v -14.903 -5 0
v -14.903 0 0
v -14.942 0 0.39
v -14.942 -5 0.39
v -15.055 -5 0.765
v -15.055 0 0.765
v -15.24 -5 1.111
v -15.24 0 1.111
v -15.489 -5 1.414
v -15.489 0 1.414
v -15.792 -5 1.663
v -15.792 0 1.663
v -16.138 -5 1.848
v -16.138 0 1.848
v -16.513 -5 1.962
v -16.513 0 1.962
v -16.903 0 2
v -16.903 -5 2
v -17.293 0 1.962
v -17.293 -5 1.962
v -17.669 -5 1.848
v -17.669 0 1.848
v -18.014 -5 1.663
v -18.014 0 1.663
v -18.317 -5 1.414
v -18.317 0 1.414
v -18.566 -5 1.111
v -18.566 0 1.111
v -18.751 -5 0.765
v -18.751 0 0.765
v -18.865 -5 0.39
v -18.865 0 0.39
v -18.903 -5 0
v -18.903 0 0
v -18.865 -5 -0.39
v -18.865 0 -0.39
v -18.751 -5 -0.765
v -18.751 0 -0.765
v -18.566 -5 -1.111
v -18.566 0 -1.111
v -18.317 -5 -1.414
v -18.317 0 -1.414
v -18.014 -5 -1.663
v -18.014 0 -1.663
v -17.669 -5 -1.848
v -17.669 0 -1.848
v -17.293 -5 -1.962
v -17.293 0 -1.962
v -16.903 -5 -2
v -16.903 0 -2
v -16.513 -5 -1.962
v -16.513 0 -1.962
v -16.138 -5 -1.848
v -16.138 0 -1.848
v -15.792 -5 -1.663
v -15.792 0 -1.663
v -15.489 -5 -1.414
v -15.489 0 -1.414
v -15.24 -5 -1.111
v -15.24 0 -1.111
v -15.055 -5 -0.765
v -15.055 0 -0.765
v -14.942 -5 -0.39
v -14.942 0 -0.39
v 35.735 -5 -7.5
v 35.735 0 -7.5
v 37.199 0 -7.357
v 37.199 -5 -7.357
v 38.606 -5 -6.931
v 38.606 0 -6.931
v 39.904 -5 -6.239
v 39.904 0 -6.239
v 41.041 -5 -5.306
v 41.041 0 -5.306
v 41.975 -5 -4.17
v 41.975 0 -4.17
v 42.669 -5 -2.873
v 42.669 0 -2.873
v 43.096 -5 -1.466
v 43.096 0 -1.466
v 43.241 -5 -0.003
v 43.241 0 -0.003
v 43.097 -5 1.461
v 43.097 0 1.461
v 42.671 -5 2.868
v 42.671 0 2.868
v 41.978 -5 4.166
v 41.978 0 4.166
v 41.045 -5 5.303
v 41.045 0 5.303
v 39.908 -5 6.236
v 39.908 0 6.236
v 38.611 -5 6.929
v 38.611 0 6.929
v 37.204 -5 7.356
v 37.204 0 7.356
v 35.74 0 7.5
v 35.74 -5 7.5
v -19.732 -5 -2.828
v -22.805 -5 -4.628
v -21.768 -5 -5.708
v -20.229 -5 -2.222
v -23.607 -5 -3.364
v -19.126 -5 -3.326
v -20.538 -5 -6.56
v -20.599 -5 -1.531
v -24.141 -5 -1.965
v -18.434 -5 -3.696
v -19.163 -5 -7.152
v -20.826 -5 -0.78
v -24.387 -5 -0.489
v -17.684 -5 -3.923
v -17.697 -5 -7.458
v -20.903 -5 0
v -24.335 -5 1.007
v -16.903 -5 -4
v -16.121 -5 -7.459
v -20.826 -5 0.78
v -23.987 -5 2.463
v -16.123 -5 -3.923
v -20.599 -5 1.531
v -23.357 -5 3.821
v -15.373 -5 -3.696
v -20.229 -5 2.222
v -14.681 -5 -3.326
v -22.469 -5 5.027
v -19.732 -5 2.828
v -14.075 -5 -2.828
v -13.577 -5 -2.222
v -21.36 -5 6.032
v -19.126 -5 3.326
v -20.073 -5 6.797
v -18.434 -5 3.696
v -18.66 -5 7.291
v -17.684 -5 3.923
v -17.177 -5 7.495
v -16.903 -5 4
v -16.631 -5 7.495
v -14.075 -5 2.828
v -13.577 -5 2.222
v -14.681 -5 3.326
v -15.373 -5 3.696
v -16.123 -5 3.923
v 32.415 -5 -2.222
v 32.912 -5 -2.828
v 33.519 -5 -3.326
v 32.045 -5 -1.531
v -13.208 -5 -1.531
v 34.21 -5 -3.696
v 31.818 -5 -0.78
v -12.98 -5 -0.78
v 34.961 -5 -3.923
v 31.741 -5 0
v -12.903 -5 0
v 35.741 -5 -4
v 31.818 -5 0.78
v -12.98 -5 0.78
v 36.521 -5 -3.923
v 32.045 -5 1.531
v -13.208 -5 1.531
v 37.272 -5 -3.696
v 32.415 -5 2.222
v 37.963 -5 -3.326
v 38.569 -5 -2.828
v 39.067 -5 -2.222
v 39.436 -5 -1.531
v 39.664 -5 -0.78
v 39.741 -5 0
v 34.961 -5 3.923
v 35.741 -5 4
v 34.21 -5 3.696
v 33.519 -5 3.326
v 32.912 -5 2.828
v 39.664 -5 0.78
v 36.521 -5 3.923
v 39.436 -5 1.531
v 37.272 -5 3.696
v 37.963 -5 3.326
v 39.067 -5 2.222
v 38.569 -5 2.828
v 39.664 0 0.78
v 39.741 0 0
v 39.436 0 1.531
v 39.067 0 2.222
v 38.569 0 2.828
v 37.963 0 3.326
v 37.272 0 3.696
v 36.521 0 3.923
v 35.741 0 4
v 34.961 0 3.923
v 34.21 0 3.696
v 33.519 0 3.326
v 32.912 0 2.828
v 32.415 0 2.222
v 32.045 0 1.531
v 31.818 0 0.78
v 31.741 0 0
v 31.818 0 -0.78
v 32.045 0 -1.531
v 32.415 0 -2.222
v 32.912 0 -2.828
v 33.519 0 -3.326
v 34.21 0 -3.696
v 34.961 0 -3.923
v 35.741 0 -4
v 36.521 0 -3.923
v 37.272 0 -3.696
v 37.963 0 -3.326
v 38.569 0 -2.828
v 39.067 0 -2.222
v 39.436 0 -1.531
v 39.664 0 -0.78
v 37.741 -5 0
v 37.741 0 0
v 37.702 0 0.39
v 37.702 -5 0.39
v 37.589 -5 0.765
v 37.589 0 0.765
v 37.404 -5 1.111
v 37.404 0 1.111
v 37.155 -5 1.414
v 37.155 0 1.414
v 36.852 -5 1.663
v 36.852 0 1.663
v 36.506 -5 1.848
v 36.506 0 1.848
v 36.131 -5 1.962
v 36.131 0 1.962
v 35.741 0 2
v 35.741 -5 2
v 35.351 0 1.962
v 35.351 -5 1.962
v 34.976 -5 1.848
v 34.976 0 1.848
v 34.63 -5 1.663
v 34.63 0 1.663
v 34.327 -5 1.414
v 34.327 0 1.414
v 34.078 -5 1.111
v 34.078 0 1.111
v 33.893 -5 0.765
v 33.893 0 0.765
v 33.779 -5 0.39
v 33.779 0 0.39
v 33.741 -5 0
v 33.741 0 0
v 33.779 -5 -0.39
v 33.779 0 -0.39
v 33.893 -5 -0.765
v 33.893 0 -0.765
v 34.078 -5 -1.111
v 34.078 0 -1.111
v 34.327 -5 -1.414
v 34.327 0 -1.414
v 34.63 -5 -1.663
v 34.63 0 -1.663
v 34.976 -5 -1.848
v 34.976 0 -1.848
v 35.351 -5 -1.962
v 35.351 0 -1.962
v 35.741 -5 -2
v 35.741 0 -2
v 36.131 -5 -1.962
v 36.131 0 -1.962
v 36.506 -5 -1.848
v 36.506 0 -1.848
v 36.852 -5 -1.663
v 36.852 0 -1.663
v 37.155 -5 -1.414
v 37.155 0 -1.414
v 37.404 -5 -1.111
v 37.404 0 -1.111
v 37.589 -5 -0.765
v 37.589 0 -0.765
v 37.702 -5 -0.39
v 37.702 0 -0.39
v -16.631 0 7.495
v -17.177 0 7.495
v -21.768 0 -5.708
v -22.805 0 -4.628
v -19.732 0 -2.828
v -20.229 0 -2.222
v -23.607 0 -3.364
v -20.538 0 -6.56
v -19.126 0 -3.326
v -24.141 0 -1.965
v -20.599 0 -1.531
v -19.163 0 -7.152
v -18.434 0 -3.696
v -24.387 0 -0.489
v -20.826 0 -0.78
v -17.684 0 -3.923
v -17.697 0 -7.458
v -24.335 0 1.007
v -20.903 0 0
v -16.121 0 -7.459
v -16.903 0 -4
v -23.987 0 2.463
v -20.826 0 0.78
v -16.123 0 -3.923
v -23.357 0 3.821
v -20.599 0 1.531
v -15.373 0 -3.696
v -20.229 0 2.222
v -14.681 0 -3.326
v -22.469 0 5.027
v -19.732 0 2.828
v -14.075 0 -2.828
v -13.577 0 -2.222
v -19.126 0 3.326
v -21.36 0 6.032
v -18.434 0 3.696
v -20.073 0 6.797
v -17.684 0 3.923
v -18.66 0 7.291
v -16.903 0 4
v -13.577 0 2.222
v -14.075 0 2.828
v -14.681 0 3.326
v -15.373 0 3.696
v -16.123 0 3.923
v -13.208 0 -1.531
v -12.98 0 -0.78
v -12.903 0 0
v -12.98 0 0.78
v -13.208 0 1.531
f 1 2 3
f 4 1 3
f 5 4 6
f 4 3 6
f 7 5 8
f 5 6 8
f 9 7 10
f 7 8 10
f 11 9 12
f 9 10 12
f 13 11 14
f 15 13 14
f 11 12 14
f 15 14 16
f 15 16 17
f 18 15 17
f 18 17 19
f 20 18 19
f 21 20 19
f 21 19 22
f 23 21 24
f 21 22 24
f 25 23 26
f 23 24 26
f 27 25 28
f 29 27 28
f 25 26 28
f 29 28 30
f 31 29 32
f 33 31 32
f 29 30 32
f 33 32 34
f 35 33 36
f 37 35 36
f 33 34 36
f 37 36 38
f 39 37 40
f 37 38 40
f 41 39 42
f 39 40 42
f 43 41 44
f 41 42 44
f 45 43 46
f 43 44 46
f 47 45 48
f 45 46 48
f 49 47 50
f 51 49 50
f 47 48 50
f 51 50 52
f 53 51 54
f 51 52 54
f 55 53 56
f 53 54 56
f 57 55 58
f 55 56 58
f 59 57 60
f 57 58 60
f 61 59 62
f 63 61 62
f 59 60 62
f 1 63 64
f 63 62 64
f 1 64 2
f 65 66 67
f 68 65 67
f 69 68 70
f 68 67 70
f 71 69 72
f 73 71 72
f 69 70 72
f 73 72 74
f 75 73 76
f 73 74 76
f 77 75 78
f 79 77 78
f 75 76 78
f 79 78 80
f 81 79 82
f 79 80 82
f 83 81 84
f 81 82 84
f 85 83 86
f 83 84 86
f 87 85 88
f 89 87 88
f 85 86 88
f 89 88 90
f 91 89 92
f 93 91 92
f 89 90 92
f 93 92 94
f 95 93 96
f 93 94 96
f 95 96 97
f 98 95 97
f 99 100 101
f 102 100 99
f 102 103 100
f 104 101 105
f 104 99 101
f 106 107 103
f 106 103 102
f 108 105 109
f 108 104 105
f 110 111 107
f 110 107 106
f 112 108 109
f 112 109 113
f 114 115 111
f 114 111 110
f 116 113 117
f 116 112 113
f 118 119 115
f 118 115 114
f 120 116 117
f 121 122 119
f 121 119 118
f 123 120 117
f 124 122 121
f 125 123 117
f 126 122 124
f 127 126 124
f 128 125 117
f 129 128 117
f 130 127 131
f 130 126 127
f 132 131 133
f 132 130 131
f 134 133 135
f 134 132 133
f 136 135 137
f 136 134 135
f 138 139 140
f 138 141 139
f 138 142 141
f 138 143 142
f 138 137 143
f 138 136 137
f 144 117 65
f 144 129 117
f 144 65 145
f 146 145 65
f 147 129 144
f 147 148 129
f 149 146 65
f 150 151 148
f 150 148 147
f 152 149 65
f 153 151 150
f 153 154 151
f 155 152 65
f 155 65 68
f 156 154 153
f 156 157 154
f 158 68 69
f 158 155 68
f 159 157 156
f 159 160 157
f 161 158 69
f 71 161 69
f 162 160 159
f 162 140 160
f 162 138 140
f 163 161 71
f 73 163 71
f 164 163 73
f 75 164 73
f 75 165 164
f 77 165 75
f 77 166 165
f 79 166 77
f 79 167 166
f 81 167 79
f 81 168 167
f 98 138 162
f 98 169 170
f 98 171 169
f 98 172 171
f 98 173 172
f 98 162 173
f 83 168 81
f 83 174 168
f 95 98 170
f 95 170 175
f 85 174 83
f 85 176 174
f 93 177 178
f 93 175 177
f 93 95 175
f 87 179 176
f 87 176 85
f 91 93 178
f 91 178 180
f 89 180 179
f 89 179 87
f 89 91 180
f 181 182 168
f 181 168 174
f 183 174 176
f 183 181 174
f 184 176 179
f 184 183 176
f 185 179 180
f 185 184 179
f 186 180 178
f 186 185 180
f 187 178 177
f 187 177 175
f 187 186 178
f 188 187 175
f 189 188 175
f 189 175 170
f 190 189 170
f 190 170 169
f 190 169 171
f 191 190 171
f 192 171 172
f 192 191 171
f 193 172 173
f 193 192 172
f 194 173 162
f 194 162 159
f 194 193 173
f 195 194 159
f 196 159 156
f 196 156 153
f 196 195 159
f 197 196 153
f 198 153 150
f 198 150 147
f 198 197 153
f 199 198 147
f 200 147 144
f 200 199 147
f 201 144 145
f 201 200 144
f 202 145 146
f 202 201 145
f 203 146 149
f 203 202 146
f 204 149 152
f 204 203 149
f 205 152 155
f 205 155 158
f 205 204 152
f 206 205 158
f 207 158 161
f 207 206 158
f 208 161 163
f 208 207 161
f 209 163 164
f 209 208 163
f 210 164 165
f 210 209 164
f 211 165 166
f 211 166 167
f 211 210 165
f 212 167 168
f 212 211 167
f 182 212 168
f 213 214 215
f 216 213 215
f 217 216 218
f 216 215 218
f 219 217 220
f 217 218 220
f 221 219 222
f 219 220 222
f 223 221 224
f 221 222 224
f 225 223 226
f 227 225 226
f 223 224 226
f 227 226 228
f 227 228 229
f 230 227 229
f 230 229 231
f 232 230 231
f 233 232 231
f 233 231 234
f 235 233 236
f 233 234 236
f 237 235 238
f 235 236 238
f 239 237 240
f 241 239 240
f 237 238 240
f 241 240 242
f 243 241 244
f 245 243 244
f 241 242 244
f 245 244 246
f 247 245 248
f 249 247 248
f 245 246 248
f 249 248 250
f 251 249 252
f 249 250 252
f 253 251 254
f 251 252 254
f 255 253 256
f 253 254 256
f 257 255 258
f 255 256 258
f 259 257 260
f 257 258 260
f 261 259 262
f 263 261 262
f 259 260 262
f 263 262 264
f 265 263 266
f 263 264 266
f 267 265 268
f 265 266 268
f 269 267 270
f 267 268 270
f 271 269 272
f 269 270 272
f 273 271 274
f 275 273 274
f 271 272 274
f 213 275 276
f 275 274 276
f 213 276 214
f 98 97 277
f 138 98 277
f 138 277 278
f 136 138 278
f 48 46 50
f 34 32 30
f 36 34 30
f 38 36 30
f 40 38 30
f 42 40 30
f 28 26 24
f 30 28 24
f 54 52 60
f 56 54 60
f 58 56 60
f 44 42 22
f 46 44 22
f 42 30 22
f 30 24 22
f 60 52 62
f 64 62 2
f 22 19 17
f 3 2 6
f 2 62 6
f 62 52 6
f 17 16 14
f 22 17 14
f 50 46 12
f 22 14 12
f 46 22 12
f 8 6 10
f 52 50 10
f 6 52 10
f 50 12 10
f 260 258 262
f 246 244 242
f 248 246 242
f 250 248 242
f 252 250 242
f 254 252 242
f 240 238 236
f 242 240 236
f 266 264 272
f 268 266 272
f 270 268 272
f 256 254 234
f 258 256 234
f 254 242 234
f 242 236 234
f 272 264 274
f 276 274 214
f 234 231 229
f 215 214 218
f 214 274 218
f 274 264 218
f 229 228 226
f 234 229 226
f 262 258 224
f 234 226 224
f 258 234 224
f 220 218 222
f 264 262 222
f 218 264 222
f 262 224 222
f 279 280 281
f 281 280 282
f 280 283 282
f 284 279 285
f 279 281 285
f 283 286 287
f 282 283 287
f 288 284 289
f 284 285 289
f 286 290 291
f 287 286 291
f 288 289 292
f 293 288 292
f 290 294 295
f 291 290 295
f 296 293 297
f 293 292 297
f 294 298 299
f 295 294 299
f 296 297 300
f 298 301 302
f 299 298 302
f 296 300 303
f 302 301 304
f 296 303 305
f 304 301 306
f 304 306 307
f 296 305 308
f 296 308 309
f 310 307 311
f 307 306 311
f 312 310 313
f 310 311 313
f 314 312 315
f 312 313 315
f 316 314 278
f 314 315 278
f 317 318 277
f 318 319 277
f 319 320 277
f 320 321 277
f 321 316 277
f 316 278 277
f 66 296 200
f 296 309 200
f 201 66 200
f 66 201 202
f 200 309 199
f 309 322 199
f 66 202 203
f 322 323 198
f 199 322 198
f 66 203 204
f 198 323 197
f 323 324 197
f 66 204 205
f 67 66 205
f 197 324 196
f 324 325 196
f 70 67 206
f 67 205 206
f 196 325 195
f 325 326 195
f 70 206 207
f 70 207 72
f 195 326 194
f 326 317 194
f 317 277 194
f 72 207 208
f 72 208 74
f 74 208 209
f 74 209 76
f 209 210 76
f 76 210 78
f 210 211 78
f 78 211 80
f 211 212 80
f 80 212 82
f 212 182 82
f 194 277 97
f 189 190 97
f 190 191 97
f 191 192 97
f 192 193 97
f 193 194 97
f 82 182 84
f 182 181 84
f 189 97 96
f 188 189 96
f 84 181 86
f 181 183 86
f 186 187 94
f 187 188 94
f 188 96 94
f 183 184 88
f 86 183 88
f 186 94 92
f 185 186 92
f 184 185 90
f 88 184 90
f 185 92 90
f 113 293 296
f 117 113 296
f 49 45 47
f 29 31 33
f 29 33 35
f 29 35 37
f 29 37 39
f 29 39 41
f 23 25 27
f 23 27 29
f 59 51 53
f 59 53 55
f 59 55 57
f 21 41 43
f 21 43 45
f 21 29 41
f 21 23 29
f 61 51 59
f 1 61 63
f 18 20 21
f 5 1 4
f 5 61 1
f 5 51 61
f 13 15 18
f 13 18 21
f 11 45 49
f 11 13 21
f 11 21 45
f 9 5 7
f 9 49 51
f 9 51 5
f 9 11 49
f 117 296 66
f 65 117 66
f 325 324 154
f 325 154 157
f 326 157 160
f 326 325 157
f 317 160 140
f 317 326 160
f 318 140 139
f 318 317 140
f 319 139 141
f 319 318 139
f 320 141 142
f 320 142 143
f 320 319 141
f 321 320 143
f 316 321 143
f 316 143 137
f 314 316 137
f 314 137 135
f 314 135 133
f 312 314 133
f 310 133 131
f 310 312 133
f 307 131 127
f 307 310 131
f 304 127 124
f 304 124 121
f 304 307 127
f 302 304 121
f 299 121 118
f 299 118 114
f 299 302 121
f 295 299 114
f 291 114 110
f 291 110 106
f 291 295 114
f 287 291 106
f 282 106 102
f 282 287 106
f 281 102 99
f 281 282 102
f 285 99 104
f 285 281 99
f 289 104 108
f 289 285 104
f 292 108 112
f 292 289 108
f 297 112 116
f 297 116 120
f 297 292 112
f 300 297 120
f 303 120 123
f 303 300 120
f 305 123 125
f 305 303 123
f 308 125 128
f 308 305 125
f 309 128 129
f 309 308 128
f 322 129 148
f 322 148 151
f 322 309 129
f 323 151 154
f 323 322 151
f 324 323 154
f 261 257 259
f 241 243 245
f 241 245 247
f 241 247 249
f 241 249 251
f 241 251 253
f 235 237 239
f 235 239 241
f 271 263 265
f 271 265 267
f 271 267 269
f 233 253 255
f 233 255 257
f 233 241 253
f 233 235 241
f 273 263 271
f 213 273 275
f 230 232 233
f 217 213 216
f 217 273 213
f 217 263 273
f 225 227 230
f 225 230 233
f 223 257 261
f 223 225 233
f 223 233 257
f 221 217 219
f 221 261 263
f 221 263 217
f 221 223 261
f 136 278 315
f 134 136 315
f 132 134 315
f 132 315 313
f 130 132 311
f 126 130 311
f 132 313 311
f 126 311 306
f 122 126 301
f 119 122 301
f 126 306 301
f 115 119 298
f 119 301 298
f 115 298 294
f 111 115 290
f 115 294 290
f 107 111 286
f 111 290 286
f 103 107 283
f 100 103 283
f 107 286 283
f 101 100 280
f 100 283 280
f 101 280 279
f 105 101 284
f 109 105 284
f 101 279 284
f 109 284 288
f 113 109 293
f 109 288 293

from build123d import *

# Parameters (mm, degrees)
F0_R     = 4
F0_R_2   = 2
F1_DEPTH = 5


with BuildPart() as f1:
    # F0 (on Front) → F1 (new body)
    with BuildSketch(Plane.XZ):
        with BuildLine():
            Line((35.740174, 7.5), (-16.630535, 7.49504))
            Line((-16.630535, 7.49504), (-17.177368, 7.494989))
            ThreePointArc((-17.177368, 7.494989), (-24.398712, 0.260615), (-17.697274, -7.457849))
            Line((-17.697274, -7.457849), (-16.120977, -7.459093))
            Line((-16.120977, -7.459093), (35.734968, -7.499998))
            ThreePointArc((35.734968, -7.499998), (43.240884, -0.002603), (35.740174, 7.5))
        make_face()
        with Locations((-16.903242, 0)):
            Circle(F0_R, mode=Mode.SUBTRACT)
        with Locations((35.740884, 0)):
            Circle(F0_R, mode=Mode.SUBTRACT)
        with Locations((35.740884, 0)):
            Circle(F0_R_2)
        with Locations((-16.903242, 0)):
            Circle(F0_R_2)
    extrude(amount=F1_DEPTH)


solid = f1.part
